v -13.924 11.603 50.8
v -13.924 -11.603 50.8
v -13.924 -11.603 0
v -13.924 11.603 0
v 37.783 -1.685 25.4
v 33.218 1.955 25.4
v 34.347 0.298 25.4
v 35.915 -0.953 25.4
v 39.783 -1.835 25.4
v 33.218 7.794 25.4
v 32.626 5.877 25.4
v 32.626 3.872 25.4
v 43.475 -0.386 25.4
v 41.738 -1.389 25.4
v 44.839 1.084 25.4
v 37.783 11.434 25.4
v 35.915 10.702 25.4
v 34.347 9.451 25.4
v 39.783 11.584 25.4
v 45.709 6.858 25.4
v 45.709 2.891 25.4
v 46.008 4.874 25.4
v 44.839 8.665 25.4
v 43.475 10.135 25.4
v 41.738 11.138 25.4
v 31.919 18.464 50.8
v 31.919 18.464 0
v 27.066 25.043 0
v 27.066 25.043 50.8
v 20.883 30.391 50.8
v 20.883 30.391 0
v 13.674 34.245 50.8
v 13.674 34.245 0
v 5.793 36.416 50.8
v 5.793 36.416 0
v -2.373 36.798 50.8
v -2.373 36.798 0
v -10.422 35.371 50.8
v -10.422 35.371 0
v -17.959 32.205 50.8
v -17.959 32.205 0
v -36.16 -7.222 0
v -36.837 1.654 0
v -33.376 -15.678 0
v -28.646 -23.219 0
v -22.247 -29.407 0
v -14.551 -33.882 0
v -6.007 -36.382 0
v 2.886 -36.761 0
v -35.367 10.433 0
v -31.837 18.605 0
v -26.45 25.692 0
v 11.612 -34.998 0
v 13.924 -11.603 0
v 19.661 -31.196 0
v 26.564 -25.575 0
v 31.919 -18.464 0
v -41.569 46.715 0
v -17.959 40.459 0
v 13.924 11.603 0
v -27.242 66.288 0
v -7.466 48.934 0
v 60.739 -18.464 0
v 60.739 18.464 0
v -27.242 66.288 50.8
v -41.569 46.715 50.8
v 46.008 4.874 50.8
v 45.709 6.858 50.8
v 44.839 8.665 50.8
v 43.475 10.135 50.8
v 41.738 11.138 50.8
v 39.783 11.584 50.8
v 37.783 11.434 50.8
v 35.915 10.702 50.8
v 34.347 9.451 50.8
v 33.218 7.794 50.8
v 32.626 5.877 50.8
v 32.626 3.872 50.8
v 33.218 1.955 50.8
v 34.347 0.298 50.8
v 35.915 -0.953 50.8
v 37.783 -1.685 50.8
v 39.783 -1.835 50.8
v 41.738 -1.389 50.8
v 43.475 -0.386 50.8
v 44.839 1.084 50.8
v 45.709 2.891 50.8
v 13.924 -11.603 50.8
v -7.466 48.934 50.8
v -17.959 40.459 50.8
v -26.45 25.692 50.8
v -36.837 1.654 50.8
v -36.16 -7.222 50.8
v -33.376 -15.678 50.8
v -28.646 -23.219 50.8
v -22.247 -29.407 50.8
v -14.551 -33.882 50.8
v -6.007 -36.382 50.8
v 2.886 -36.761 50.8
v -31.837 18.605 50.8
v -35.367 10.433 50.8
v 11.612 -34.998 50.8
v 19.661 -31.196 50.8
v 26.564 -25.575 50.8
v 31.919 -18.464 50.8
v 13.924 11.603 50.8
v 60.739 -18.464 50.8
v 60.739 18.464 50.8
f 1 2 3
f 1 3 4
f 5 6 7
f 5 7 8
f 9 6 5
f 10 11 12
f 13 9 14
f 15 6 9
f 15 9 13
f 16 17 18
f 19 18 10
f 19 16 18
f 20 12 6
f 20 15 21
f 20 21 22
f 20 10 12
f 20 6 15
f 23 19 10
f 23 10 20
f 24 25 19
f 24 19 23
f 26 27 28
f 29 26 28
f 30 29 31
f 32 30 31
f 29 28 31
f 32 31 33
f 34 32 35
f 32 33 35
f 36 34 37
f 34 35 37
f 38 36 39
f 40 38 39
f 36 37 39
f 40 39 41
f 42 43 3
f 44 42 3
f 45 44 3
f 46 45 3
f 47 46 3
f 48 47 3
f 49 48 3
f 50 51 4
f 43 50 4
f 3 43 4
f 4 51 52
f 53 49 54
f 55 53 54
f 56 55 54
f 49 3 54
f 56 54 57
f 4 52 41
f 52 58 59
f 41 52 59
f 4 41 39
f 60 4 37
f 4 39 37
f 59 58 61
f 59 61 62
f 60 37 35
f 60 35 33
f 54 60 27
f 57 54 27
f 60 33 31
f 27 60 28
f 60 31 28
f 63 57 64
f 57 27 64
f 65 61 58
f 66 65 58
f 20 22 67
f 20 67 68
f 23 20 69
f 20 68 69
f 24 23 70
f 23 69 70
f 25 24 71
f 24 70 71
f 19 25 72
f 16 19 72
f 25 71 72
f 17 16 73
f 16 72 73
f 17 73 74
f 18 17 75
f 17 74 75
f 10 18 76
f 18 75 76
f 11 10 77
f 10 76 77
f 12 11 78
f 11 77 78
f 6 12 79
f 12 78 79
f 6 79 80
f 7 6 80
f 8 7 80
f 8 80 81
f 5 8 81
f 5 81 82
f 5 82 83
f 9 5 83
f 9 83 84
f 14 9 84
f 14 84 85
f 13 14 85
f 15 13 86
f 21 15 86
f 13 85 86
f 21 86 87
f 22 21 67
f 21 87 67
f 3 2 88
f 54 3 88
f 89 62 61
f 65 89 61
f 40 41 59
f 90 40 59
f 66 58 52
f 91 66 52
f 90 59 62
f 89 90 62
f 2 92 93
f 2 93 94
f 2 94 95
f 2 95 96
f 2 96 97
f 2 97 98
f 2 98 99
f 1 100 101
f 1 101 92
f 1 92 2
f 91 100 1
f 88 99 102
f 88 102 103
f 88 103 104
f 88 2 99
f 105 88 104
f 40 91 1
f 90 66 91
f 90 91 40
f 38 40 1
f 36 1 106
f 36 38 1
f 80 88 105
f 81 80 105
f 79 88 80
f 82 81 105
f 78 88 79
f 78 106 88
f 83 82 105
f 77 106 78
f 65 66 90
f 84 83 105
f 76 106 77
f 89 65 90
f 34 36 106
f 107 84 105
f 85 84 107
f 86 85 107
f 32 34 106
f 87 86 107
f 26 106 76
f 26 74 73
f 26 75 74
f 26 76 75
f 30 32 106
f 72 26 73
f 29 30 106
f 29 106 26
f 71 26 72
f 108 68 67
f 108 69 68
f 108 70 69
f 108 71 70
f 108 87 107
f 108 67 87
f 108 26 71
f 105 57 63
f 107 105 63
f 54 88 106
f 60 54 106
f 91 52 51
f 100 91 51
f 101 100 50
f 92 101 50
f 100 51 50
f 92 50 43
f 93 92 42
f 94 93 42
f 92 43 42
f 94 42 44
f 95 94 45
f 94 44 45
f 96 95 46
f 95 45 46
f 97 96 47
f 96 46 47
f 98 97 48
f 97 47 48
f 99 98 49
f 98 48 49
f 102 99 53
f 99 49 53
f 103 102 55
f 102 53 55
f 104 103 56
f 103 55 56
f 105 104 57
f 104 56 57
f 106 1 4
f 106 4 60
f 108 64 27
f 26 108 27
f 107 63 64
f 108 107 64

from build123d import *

# Parameters (mm, degrees)
F1_DEPTH = 50.8
F2_W     = 27.847112
F2_H     = 23.205928
F3_DEPTH = 118.98803
F4_R     = 6.728536
F5_DEPTH = 25.4


with BuildPart() as f1:
    # F0 (on Top) → F1 (new body)
    with BuildSketch(Plane.XY):
        with BuildLine():
            Line((-41.568879, 46.714541), (-26.450199, 25.692446))
            ThreePointArc((-26.450199, 25.692446), (-22.246811, -29.407385), (31.918666, -18.463846))
            Line((31.918666, -18.463846), (60.738988, -18.463846))
            Line((60.738988, -18.463846), (60.738988, 18.463846))
            Line((60.738988, 18.463846), (31.918666, 18.463846))
            ThreePointArc((31.918666, 18.463846), (9.793967, 35.549867), (-17.959369, 32.205215))
            Line((-17.959369, 32.205215), (-17.959369, 40.459029))
            Line((-17.959369, 40.459029), (-7.466254, 48.93424))
            Line((-7.466254, 48.93424), (-27.24174, 66.288233))
            Line((-27.24174, 66.288233), (-41.568879, 46.714541))
        make_face()
    extrude(amount=F1_DEPTH)

    # F2 (on face) → F3 (cut)
    with BuildSketch(Plane.XY.offset(50.8)):
        Rectangle(F2_W, F2_H)
    extrude(amount=-F3_DEPTH, mode=Mode.SUBTRACT)

    # F4 (on face) → F5 (cut)
    with BuildSketch(Plane.XY.offset(50.8)):
        with Locations((39.279759, 4.874428)):
            Circle(F4_R)
    extrude(amount=-F5_DEPTH, mode=Mode.SUBTRACT)


solid = f1.part
